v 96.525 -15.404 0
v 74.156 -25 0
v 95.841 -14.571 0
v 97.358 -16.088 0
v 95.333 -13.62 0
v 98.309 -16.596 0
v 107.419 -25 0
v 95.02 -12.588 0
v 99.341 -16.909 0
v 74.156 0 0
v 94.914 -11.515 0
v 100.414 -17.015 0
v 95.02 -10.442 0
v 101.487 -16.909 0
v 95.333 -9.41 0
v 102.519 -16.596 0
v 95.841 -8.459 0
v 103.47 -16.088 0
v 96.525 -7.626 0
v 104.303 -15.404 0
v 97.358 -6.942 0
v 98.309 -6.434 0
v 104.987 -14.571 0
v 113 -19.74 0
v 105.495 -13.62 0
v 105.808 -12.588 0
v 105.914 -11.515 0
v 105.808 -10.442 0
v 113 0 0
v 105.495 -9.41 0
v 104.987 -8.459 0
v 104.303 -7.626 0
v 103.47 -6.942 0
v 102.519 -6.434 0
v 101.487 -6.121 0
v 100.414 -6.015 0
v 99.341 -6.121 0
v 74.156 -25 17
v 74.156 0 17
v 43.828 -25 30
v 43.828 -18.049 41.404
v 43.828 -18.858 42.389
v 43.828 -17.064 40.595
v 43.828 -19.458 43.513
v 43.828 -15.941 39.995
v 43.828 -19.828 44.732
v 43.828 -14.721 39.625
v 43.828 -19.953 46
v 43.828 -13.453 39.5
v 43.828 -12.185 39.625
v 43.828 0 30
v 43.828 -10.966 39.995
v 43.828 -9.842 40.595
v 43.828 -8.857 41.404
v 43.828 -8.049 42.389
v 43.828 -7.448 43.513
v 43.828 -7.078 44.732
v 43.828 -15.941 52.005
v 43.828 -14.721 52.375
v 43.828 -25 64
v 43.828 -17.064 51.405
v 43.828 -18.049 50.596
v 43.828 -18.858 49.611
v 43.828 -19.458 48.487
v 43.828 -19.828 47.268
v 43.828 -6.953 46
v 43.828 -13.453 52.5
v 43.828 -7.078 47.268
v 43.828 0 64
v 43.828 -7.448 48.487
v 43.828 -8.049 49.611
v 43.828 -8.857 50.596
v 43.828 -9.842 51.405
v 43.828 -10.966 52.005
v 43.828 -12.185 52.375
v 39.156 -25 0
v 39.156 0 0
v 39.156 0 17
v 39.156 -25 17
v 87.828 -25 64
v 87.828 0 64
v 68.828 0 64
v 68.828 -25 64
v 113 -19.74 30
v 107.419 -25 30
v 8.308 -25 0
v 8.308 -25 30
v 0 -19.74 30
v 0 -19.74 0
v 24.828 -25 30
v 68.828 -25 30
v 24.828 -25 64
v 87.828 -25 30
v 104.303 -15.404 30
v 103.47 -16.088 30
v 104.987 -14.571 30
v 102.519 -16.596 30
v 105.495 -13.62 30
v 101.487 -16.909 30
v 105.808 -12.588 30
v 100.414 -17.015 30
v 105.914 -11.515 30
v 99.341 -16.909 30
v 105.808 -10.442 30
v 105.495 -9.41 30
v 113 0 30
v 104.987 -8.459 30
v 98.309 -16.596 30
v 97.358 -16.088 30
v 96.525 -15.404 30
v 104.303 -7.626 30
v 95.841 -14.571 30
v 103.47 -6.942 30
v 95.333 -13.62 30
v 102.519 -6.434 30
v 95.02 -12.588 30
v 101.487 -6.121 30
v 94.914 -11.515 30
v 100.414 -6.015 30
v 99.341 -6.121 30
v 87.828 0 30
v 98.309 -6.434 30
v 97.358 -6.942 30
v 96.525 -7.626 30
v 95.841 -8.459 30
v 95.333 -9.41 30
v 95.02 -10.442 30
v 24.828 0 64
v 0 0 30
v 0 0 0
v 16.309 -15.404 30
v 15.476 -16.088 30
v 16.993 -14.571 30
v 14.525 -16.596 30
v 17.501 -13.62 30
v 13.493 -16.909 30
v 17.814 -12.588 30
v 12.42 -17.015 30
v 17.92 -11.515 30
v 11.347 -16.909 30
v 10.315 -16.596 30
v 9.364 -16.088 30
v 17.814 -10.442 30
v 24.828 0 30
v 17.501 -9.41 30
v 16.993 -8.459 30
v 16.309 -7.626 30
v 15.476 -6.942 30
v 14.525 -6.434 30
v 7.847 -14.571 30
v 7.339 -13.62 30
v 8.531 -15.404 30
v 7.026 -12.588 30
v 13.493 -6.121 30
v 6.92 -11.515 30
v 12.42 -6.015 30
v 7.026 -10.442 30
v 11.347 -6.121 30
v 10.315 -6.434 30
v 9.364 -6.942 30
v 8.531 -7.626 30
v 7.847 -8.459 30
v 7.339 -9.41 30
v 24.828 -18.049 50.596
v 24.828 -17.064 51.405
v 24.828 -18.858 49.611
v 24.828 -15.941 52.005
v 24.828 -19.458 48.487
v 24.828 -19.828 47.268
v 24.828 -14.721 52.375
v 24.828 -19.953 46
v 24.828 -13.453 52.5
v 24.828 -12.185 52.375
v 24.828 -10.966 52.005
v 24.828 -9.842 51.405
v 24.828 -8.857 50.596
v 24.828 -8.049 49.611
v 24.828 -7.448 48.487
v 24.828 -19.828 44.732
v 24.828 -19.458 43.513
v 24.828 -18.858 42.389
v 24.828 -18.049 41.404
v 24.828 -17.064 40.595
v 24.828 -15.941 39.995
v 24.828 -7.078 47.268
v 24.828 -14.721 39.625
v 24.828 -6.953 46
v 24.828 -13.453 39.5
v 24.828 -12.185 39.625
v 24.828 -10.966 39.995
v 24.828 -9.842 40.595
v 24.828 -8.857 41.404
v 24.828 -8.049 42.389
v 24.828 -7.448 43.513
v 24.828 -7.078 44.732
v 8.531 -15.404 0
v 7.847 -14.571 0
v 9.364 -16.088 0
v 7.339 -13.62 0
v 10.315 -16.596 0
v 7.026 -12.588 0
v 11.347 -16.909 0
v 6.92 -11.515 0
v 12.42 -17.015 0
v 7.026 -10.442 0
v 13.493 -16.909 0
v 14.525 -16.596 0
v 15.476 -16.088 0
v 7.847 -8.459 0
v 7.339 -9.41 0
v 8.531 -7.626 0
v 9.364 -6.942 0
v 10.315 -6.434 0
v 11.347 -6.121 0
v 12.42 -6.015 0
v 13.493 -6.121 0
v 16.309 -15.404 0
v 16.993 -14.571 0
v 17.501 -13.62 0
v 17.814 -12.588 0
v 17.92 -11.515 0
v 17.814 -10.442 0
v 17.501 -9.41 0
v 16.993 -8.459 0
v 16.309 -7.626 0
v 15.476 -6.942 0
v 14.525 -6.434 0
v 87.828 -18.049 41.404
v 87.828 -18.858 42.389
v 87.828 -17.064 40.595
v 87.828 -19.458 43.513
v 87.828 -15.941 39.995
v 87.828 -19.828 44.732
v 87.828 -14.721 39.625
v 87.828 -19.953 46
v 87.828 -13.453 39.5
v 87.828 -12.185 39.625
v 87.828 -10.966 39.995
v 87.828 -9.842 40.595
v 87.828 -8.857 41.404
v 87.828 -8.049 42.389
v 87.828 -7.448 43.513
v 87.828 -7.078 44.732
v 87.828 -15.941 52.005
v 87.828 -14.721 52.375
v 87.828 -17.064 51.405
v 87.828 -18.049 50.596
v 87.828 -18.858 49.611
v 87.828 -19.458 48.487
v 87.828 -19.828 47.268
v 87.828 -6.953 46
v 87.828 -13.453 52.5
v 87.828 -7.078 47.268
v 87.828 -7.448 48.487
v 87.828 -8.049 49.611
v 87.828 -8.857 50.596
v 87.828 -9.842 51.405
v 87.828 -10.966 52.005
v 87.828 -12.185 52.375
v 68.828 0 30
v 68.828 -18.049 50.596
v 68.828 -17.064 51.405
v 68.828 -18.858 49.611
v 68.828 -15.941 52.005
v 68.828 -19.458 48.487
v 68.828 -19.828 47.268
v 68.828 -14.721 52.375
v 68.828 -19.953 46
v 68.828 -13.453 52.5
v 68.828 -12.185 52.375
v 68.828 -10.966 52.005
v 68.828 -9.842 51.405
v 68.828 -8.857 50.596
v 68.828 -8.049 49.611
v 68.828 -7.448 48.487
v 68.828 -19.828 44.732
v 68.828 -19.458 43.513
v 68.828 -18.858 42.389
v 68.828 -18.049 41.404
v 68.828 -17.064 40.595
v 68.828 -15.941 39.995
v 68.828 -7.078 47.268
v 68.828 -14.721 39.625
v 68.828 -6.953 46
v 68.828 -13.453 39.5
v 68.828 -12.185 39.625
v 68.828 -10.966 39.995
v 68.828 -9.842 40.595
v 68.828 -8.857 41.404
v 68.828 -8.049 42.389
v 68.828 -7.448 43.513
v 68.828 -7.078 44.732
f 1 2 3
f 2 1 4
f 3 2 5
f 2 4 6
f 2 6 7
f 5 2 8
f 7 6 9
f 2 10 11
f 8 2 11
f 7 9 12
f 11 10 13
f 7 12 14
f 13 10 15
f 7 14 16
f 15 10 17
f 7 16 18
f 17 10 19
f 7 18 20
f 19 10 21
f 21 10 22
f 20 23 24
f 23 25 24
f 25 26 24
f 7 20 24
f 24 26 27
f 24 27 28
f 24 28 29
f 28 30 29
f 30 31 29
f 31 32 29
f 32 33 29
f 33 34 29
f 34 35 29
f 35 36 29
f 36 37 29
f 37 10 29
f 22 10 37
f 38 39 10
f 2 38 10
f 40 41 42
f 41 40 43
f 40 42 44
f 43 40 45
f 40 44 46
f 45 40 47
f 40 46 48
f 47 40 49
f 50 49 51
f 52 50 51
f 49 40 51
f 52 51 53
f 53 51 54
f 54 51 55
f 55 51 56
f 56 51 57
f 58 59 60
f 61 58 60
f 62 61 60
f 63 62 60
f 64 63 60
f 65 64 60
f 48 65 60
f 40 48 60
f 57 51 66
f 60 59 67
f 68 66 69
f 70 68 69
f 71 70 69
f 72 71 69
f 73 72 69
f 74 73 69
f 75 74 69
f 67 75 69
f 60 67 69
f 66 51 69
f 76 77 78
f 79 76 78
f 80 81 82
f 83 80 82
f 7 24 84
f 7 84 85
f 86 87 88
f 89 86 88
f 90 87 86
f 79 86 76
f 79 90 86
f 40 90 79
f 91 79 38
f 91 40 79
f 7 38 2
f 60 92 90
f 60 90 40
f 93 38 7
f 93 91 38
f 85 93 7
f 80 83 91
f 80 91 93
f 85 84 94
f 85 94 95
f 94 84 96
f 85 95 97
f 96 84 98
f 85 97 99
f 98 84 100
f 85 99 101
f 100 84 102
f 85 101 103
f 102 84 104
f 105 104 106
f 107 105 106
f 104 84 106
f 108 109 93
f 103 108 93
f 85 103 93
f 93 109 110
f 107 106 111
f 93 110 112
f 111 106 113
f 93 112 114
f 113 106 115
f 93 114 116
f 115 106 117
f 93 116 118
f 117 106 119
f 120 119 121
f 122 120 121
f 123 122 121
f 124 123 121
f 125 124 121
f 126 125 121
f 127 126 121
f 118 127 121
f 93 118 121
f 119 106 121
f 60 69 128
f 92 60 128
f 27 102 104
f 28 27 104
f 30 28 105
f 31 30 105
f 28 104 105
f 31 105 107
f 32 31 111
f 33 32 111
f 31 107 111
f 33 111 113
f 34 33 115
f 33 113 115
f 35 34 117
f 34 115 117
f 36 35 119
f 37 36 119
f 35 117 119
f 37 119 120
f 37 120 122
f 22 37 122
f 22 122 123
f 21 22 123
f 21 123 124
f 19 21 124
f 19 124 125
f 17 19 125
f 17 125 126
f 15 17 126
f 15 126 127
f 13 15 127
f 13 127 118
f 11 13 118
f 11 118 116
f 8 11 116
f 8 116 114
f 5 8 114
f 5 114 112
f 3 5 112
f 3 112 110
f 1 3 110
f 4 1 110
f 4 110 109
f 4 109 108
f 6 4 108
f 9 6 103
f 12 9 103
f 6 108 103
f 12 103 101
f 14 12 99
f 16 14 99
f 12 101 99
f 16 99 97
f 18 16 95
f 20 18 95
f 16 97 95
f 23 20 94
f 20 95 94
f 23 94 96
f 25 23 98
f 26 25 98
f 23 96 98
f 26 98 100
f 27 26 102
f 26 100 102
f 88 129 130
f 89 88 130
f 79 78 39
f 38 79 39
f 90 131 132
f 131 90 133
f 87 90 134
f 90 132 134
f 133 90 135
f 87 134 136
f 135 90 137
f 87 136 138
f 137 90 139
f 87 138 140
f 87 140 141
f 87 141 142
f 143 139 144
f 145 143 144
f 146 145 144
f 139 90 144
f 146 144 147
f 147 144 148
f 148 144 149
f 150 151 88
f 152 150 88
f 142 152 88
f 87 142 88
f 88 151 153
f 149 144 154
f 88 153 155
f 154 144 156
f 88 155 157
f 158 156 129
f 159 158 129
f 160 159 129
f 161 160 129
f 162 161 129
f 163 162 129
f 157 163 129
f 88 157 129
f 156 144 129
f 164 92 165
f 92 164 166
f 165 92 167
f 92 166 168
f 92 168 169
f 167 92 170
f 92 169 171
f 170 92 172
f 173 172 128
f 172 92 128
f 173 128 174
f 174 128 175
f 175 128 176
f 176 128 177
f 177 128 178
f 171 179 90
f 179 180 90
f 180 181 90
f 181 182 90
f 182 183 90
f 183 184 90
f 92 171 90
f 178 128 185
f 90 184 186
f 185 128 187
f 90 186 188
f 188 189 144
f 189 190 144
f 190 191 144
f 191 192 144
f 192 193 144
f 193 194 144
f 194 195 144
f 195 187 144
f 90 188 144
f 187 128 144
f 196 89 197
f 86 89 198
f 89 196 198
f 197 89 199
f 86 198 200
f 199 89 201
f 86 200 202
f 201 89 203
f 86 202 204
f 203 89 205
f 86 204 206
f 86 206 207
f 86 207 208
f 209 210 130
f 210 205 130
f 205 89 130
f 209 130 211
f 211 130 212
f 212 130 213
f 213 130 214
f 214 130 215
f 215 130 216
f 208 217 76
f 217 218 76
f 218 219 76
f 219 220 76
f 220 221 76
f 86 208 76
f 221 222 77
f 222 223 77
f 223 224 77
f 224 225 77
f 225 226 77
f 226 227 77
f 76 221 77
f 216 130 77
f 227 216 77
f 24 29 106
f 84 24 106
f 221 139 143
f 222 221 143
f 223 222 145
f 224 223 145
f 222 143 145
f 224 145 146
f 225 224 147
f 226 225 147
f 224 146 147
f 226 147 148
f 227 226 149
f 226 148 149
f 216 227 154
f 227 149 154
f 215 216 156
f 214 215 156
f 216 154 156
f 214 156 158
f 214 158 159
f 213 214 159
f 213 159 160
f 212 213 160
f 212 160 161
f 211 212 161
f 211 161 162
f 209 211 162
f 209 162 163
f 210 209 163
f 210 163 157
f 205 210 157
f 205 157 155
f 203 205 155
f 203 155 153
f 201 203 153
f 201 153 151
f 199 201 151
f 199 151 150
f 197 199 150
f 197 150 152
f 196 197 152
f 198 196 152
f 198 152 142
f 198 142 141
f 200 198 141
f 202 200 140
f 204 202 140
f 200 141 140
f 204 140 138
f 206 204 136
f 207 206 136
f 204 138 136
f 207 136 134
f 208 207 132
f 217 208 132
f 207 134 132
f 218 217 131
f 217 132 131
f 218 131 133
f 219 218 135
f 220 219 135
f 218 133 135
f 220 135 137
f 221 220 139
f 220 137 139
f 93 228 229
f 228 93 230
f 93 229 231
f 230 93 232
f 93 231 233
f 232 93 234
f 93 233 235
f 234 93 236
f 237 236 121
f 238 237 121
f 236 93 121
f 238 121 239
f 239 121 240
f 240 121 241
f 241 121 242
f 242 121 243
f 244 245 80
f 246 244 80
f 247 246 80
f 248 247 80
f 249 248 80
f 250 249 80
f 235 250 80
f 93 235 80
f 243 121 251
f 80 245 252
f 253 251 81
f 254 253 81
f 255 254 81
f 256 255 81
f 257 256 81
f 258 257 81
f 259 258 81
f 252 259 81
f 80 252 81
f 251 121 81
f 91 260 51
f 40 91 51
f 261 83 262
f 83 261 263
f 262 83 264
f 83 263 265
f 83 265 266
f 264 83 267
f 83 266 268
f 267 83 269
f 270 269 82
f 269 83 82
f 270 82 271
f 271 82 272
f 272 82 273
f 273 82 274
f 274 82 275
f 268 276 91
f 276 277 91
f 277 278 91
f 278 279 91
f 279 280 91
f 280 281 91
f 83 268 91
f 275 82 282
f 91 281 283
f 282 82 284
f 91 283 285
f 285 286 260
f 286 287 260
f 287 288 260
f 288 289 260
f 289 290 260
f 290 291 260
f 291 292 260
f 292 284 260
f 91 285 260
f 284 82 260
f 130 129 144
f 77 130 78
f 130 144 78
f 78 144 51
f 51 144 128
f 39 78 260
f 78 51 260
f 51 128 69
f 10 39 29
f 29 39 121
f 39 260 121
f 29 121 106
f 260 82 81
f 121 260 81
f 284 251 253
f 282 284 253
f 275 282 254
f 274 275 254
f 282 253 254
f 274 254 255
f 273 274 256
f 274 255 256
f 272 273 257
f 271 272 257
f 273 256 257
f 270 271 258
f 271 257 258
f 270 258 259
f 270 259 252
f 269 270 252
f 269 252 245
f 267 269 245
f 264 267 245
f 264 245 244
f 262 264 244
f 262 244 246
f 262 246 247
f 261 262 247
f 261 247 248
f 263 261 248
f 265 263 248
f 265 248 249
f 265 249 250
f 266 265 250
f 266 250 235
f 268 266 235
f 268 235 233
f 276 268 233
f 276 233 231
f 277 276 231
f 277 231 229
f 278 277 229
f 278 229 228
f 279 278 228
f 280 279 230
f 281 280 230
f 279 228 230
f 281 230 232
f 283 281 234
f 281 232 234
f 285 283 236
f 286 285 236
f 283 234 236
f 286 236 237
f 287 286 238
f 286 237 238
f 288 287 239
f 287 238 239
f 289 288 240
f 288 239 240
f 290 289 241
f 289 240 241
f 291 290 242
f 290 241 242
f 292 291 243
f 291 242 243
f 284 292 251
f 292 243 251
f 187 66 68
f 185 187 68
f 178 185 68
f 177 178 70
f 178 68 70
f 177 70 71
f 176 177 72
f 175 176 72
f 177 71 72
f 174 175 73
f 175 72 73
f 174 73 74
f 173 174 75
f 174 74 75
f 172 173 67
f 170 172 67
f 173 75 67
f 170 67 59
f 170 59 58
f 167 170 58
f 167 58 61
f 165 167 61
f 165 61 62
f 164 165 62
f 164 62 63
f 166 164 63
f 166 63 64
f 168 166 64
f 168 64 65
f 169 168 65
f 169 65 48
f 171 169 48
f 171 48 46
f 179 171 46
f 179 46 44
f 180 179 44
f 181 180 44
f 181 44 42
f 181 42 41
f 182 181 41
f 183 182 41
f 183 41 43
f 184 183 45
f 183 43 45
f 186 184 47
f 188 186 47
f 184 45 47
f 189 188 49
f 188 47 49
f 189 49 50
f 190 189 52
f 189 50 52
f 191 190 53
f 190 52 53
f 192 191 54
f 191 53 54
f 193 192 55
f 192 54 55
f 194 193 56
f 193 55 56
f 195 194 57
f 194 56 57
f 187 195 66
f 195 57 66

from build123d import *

# Parameters (mm, degrees)
F1_DEPTH = 25
F3_R     = 6.5
F4_DEPTH = 87.828853
F5_DEPTH = 30.001
F2_R     = 5.5
F6_DEPTH = 30.001


with BuildPart() as f1:
    # F0 (on Front) → F1 (new body)
    with BuildSketch(Plane.XZ):
        Polygon((0, 30), (0, 0), (39.15558, 0), (39.15558, 17), (74.15558, 17), (74.15558, 0), (113, 0), (113, 30), (87.827853, 30), (87.827853, 64), (68.827853, 64), (68.827853, 30), (43.827853, 30), (43.827853, 64), (24.827853, 64), (24.827853, 30), align=None)
    extrude(amount=F1_DEPTH)

    # F3 (on face) → F4 (cut, through all)
    with BuildSketch(Plane.YZ.offset(87.827853)):
        with Locations((-13.453124, 46)):
            Circle(F3_R)
    extrude(amount=-F4_DEPTH, mode=Mode.SUBTRACT)

    # F2 (on face) → F5 (cut, through all)
    with BuildSketch(Plane.XY.offset(30)):
        Polygon((0, -25), (8.3075, -25), (0, -19.74), align=None)
        Polygon((113, -19.74), (107.418746, -25), (113, -25), align=None)
    extrude(amount=-F5_DEPTH, mode=Mode.SUBTRACT)

    # F2 (on face) → F6 (cut, through all)
    with BuildSketch(Plane.XY.offset(30)):
        Polygon((113, -19.74), (107.418746, -25), (113, -25), align=None)
        Polygon((0, -25), (8.3075, -25), (0, -19.74), align=None)
        with Locations((12.419996, -11.515)):
            Circle(F2_R)
        with Locations((100.413927, -11.515)):
            Circle(F2_R)
    extrude(amount=-F6_DEPTH, mode=Mode.SUBTRACT)


solid = f1.part
